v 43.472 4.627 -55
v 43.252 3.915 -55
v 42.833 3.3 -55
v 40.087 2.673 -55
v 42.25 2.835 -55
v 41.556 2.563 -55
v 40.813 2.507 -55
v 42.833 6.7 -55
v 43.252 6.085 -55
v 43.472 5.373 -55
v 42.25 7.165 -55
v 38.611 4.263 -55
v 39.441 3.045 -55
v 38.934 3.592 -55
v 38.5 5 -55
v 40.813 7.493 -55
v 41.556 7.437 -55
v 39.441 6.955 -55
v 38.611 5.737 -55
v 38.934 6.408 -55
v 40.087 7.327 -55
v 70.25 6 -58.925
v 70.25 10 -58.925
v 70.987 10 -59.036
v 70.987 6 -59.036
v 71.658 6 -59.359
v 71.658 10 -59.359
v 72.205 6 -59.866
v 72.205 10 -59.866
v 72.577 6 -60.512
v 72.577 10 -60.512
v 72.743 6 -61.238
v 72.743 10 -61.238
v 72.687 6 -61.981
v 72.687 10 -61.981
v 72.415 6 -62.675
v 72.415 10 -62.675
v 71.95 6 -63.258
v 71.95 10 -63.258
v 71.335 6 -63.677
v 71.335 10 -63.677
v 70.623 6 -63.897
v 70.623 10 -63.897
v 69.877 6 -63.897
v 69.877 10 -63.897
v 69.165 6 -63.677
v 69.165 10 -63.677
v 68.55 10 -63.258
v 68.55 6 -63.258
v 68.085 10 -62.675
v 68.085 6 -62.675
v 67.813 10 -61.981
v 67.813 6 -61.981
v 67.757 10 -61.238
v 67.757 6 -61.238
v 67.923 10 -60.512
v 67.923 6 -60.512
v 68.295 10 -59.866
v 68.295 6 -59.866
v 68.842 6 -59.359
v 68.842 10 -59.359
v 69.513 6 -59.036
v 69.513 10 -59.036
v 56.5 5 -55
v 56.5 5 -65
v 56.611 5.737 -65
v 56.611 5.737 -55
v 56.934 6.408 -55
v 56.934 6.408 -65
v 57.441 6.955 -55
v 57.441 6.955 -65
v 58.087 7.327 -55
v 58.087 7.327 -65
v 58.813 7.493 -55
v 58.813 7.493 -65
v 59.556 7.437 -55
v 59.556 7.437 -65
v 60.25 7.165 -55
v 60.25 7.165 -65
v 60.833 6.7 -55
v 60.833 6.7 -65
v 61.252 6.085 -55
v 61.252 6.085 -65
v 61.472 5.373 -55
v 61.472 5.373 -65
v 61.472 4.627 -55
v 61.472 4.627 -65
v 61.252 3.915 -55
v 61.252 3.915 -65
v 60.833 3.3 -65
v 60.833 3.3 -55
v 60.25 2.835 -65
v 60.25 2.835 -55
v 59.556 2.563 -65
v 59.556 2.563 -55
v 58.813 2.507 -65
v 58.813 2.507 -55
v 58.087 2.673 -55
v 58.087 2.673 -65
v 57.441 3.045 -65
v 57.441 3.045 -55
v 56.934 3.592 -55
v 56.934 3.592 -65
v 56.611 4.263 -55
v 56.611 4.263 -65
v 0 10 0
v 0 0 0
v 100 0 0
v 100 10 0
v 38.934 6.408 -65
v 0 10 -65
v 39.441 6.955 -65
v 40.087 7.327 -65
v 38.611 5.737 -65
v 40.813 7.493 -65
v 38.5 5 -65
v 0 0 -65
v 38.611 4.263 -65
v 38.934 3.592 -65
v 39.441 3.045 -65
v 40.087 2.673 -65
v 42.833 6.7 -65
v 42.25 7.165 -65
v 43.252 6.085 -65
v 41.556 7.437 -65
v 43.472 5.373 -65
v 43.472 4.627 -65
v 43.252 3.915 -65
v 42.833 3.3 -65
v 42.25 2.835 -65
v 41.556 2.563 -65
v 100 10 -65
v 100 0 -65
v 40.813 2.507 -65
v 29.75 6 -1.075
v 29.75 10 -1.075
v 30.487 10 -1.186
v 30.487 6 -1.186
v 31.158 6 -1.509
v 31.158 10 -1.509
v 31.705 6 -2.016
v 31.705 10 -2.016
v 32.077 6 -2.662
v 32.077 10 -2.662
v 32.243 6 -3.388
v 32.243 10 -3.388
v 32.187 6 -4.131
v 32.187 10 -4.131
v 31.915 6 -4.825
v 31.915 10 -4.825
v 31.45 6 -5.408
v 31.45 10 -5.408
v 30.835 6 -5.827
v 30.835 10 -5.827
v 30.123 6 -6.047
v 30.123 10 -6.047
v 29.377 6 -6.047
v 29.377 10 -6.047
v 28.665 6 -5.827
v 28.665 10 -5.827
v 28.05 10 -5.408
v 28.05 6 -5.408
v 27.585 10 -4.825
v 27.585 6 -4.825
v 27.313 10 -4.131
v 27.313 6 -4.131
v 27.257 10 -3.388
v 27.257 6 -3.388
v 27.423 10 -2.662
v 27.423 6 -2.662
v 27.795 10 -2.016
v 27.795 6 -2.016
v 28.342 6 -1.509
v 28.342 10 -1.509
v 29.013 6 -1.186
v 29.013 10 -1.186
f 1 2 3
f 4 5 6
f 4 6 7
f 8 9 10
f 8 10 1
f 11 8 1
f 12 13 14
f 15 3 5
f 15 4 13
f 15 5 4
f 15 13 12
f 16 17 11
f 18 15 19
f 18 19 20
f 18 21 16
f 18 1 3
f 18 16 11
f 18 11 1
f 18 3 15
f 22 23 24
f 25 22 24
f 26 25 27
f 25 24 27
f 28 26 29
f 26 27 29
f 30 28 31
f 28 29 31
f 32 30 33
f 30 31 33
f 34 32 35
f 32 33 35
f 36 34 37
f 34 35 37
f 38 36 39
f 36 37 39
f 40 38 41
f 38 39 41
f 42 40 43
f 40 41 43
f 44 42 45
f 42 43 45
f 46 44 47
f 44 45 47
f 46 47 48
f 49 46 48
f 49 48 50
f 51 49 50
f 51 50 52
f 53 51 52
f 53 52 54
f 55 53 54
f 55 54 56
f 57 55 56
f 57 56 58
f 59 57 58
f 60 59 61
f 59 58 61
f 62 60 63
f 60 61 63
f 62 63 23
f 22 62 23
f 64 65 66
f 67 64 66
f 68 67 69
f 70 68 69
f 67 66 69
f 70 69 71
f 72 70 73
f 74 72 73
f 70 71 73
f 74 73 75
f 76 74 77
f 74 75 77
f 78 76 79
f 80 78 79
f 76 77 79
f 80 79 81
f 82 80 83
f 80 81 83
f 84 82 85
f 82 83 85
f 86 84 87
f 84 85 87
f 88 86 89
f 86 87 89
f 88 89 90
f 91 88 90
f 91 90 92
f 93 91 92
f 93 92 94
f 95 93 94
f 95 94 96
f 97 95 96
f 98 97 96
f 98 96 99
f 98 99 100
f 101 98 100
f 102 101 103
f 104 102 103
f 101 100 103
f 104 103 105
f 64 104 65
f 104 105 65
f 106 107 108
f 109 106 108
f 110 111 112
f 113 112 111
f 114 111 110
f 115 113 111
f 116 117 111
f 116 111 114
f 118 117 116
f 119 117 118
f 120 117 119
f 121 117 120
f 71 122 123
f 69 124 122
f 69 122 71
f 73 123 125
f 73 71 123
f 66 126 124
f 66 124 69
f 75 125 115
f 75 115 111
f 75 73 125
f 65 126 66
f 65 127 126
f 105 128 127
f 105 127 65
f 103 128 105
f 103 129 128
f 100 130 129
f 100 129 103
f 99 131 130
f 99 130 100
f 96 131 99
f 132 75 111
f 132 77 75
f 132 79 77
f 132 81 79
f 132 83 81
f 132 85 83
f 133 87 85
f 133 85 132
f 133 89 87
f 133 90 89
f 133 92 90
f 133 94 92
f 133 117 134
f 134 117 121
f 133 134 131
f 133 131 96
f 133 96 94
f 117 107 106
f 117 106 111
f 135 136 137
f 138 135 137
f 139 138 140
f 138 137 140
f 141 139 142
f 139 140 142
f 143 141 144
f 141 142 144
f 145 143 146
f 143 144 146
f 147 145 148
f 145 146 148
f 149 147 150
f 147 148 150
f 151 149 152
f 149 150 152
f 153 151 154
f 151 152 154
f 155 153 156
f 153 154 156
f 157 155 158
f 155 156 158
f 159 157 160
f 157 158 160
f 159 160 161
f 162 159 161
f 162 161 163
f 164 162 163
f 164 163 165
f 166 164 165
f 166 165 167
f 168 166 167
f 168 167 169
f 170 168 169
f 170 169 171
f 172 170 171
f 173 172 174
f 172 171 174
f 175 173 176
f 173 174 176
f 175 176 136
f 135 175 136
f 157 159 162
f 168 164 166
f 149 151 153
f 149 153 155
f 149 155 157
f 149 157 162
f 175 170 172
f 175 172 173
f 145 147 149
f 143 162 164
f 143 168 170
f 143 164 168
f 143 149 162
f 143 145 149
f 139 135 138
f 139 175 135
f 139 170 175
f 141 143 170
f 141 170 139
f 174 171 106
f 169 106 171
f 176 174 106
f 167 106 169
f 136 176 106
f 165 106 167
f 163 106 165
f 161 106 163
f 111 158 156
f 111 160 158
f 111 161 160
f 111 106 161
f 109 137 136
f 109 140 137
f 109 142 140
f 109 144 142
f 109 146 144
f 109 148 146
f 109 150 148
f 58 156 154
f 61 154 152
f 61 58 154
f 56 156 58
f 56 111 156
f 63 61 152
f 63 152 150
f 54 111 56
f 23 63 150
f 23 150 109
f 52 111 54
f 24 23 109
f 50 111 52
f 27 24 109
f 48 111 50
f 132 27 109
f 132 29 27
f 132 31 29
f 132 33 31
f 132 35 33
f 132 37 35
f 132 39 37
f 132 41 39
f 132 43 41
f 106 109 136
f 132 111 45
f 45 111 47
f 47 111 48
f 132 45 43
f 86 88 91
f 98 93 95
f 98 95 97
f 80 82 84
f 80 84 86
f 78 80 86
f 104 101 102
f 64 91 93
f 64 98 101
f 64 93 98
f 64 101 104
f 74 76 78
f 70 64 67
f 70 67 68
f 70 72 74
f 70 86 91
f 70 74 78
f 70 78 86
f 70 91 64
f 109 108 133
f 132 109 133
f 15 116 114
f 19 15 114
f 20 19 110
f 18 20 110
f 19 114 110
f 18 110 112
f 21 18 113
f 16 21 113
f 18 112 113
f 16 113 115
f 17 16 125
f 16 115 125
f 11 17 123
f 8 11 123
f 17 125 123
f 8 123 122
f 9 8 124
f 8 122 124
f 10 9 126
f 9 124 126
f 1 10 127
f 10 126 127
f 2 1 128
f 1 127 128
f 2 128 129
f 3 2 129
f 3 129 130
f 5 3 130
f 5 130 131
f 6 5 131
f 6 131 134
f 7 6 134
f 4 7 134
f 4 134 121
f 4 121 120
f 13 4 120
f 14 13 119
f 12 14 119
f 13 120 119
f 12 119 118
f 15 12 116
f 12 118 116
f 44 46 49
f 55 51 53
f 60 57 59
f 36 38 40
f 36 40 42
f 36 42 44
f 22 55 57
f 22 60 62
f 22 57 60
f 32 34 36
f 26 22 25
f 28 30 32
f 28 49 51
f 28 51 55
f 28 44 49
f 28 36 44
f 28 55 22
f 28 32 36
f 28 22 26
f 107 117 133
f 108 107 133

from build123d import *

# Parameters (mm, degrees)
SKETCH1_W           = 100
SKETCH1_H           = 65
BOSS_EXTRUDE1_DEPTH = 10
SKETCH2_R           = 2.5
CUT_EXTRUDE1_DEPTH  = 10
SKETCH3_R           = 2.5
CUT_EXTRUDE2_DEPTH  = 4


with BuildPart() as part:
    # Sketch1 → Boss-Extrude1 (new body)
    with BuildSketch(Plane(origin=(0, 0, 0), x_dir=(1, 0, 0), z_dir=(0, 1, 0))):
        with Locations((50, 32.5)):
            Rectangle(SKETCH1_W, SKETCH1_H)
    extrude(amount=BOSS_EXTRUDE1_DEPTH)

    # Sketch2 → Cut-Extrude1 (cut)
    with BuildSketch(Plane(origin=(0, 0, -65), x_dir=(-1, 0, 0), z_dir=(0, 0, -1))):
        with Locations((-59, 5)):
            Circle(SKETCH2_R)
        with Locations((-41, 5)):
            Circle(SKETCH2_R)
    extrude(amount=-CUT_EXTRUDE1_DEPTH, mode=Mode.SUBTRACT)

    # Sketch3 → Cut-Extrude2 (cut)
    with BuildSketch(Plane(origin=(0, 10, 0), x_dir=(1, 0, 0), z_dir=(0, 1, 0))):
        with Locations(Location((29.75, 3.575, 0), (0, 0, 270))):
            Circle(SKETCH3_R)
        with Locations(Location((70.25, 61.425, 0), (0, 0, 270))):
            Circle(SKETCH3_R)
    extrude(amount=-CUT_EXTRUDE2_DEPTH, mode=Mode.SUBTRACT)


solid = part.part
